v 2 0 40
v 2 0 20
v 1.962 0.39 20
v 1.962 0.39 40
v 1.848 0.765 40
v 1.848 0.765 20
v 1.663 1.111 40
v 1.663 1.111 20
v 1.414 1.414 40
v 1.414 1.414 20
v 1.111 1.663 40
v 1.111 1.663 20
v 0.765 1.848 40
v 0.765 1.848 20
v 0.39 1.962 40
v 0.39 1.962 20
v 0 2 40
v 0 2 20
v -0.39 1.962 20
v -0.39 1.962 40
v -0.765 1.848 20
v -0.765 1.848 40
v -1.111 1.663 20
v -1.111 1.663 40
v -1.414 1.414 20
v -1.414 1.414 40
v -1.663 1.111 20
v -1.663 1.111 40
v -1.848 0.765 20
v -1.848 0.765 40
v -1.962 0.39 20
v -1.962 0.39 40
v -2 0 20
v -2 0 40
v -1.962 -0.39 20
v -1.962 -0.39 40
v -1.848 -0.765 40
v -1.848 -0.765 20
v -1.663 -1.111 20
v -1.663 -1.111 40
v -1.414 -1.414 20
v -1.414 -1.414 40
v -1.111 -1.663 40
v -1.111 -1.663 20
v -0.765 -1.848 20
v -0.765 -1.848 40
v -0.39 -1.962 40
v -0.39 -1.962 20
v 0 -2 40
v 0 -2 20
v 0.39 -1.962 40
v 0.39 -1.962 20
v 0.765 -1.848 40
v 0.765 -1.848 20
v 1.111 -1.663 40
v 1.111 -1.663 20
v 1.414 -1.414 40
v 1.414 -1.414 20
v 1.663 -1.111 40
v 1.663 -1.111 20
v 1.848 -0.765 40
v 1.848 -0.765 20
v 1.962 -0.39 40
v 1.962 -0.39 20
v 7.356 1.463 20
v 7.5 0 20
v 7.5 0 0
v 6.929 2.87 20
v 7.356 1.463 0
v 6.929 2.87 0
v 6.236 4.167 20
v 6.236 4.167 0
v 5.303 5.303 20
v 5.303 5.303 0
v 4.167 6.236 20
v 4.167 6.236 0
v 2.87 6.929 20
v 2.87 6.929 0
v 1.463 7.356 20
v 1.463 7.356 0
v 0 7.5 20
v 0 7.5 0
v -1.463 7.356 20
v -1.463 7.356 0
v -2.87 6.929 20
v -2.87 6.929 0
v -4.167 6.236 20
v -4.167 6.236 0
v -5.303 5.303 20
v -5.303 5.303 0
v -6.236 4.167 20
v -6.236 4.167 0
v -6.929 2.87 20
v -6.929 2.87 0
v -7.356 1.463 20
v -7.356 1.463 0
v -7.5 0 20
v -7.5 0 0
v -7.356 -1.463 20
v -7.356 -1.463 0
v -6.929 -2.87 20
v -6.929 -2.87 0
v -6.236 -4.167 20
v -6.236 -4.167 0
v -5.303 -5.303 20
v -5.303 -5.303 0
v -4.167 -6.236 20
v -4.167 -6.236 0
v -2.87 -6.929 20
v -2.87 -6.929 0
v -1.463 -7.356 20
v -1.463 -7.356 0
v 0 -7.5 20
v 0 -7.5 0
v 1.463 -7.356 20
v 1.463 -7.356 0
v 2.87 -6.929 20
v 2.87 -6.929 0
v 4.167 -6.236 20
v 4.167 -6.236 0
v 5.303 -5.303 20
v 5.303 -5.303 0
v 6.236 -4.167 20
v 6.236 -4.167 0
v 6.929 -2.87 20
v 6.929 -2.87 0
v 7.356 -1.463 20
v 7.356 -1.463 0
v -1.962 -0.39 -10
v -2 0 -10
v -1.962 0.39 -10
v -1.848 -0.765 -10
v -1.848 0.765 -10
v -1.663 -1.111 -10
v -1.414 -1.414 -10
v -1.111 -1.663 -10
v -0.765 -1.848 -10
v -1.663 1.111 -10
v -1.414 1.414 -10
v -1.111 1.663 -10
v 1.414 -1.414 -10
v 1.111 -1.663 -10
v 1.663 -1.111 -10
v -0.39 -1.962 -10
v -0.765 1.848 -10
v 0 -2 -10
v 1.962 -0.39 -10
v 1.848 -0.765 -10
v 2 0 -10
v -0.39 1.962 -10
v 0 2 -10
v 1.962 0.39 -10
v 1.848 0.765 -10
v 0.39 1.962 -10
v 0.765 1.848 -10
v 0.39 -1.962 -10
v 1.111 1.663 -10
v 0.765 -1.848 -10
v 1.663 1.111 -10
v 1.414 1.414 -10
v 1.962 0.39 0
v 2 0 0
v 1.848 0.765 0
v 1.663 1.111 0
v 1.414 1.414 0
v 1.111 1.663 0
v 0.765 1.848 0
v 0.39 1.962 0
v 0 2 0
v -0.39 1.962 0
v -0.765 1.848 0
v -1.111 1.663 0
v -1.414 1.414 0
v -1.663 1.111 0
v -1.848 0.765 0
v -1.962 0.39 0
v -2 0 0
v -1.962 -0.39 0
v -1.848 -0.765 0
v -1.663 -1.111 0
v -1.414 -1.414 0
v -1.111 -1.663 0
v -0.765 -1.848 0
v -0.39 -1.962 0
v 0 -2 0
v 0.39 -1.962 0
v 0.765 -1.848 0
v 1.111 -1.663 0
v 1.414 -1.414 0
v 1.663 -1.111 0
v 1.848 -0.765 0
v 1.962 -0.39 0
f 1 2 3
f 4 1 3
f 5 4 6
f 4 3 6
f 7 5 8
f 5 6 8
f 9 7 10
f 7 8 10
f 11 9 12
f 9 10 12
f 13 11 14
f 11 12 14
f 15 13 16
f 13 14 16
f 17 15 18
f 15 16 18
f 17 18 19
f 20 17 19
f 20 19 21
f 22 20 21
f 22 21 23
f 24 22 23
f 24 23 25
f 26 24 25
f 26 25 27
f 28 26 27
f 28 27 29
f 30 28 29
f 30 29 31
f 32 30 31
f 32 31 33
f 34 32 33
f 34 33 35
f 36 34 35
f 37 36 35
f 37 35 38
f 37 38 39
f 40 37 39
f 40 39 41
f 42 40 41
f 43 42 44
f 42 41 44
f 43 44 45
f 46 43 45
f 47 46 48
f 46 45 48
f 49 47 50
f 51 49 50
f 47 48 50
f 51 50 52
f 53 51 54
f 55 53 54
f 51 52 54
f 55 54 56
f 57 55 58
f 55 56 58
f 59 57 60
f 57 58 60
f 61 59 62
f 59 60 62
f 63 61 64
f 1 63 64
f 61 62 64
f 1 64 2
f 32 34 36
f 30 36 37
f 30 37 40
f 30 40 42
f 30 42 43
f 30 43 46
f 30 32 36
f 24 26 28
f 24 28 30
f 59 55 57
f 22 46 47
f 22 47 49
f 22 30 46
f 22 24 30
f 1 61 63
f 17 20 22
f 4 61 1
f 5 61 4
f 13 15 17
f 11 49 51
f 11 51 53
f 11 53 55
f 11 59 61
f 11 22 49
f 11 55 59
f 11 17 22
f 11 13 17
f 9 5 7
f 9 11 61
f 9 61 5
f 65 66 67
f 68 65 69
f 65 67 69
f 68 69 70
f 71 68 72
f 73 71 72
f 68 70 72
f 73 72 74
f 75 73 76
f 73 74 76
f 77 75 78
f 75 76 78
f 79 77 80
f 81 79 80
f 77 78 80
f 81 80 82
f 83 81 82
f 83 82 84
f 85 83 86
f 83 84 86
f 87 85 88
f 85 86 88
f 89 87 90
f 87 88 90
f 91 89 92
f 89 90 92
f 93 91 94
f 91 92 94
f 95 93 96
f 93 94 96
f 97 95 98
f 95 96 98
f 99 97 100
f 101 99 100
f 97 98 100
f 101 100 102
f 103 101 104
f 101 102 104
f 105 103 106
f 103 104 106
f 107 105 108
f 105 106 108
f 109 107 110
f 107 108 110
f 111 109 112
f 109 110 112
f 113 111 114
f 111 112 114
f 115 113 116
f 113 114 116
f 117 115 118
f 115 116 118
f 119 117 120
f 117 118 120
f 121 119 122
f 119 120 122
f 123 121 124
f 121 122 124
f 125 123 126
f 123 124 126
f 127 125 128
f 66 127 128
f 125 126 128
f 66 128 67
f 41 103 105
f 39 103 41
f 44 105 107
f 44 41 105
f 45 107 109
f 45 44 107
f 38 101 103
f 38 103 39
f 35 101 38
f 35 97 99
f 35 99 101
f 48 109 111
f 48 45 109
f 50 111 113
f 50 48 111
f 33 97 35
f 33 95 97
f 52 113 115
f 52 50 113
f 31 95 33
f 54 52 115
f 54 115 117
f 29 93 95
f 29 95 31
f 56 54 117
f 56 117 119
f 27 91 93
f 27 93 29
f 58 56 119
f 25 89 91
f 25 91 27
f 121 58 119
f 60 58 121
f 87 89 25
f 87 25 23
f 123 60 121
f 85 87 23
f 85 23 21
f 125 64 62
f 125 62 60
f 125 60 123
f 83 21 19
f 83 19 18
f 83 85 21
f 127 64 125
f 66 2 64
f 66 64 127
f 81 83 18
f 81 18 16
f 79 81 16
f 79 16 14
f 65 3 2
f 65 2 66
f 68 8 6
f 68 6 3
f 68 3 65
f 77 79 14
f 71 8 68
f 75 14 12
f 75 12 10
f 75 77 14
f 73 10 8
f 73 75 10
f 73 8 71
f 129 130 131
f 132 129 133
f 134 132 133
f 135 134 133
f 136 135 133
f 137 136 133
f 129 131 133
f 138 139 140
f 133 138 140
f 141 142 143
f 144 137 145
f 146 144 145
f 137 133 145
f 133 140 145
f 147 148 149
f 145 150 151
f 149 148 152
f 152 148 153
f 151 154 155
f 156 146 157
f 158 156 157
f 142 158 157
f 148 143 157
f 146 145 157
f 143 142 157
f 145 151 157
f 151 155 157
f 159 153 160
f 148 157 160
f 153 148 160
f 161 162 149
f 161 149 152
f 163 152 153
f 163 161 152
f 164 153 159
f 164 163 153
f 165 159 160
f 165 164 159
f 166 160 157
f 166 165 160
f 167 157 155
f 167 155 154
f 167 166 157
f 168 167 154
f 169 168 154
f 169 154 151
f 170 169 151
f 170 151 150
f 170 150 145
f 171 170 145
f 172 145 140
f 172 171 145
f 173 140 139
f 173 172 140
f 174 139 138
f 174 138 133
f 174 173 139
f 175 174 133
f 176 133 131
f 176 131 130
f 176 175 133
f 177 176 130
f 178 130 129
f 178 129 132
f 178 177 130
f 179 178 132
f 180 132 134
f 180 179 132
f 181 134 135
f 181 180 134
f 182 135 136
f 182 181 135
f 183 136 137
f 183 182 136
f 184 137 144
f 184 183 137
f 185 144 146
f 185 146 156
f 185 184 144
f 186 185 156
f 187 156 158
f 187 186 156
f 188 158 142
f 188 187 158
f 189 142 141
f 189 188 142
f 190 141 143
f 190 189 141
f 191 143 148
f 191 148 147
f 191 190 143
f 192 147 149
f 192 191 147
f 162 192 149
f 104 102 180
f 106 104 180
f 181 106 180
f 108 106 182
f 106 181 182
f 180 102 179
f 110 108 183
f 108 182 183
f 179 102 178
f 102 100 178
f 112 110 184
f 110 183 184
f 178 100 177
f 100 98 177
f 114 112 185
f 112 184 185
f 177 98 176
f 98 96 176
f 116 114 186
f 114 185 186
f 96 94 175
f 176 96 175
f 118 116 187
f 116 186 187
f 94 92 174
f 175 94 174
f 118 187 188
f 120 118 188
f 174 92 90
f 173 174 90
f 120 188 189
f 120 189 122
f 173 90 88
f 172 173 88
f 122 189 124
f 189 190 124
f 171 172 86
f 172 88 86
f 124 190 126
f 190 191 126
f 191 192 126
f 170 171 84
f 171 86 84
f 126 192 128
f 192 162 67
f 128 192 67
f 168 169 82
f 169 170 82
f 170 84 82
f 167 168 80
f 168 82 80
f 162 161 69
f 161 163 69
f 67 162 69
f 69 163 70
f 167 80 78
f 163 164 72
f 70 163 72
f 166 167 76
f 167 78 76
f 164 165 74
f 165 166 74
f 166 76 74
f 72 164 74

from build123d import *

# Parameters (mm, degrees)
SKETCH1_R                = 7.5
BOSS_EXTRUDE1_DEPTH      = 20
SKETCH2_R                = 1
BOSS_EXTRUDE3_DEPTH      = 40
BOSS_EXTRUDE3_DEPTH_BACK = 10
SKETCH3_R                = 2
BOSS_EXTRUDE4_DEPTH      = 40
BOSS_EXTRUDE4_DEPTH_BACK = 10


with BuildPart() as part:
    # Sketch1 → Boss-Extrude1 (new body)
    with BuildSketch(Plane.XY):
        Circle(SKETCH1_R)
    extrude(amount=BOSS_EXTRUDE1_DEPTH)

    # Sketch2 → Boss-Extrude3 (add, two sides)
    with BuildSketch(Plane.XY) as boss_extrude3_sk:
        Circle(SKETCH2_R)
    extrude(amount=BOSS_EXTRUDE3_DEPTH)
    extrude(boss_extrude3_sk.sketch, amount=-BOSS_EXTRUDE3_DEPTH_BACK)

    # Sketch3 → Boss-Extrude4 (add, two sides)
    with BuildSketch(Plane.XY) as boss_extrude4_sk:
        Circle(SKETCH3_R)
    extrude(amount=BOSS_EXTRUDE4_DEPTH)
    extrude(boss_extrude4_sk.sketch, amount=-BOSS_EXTRUDE4_DEPTH_BACK)


solid = part.part
